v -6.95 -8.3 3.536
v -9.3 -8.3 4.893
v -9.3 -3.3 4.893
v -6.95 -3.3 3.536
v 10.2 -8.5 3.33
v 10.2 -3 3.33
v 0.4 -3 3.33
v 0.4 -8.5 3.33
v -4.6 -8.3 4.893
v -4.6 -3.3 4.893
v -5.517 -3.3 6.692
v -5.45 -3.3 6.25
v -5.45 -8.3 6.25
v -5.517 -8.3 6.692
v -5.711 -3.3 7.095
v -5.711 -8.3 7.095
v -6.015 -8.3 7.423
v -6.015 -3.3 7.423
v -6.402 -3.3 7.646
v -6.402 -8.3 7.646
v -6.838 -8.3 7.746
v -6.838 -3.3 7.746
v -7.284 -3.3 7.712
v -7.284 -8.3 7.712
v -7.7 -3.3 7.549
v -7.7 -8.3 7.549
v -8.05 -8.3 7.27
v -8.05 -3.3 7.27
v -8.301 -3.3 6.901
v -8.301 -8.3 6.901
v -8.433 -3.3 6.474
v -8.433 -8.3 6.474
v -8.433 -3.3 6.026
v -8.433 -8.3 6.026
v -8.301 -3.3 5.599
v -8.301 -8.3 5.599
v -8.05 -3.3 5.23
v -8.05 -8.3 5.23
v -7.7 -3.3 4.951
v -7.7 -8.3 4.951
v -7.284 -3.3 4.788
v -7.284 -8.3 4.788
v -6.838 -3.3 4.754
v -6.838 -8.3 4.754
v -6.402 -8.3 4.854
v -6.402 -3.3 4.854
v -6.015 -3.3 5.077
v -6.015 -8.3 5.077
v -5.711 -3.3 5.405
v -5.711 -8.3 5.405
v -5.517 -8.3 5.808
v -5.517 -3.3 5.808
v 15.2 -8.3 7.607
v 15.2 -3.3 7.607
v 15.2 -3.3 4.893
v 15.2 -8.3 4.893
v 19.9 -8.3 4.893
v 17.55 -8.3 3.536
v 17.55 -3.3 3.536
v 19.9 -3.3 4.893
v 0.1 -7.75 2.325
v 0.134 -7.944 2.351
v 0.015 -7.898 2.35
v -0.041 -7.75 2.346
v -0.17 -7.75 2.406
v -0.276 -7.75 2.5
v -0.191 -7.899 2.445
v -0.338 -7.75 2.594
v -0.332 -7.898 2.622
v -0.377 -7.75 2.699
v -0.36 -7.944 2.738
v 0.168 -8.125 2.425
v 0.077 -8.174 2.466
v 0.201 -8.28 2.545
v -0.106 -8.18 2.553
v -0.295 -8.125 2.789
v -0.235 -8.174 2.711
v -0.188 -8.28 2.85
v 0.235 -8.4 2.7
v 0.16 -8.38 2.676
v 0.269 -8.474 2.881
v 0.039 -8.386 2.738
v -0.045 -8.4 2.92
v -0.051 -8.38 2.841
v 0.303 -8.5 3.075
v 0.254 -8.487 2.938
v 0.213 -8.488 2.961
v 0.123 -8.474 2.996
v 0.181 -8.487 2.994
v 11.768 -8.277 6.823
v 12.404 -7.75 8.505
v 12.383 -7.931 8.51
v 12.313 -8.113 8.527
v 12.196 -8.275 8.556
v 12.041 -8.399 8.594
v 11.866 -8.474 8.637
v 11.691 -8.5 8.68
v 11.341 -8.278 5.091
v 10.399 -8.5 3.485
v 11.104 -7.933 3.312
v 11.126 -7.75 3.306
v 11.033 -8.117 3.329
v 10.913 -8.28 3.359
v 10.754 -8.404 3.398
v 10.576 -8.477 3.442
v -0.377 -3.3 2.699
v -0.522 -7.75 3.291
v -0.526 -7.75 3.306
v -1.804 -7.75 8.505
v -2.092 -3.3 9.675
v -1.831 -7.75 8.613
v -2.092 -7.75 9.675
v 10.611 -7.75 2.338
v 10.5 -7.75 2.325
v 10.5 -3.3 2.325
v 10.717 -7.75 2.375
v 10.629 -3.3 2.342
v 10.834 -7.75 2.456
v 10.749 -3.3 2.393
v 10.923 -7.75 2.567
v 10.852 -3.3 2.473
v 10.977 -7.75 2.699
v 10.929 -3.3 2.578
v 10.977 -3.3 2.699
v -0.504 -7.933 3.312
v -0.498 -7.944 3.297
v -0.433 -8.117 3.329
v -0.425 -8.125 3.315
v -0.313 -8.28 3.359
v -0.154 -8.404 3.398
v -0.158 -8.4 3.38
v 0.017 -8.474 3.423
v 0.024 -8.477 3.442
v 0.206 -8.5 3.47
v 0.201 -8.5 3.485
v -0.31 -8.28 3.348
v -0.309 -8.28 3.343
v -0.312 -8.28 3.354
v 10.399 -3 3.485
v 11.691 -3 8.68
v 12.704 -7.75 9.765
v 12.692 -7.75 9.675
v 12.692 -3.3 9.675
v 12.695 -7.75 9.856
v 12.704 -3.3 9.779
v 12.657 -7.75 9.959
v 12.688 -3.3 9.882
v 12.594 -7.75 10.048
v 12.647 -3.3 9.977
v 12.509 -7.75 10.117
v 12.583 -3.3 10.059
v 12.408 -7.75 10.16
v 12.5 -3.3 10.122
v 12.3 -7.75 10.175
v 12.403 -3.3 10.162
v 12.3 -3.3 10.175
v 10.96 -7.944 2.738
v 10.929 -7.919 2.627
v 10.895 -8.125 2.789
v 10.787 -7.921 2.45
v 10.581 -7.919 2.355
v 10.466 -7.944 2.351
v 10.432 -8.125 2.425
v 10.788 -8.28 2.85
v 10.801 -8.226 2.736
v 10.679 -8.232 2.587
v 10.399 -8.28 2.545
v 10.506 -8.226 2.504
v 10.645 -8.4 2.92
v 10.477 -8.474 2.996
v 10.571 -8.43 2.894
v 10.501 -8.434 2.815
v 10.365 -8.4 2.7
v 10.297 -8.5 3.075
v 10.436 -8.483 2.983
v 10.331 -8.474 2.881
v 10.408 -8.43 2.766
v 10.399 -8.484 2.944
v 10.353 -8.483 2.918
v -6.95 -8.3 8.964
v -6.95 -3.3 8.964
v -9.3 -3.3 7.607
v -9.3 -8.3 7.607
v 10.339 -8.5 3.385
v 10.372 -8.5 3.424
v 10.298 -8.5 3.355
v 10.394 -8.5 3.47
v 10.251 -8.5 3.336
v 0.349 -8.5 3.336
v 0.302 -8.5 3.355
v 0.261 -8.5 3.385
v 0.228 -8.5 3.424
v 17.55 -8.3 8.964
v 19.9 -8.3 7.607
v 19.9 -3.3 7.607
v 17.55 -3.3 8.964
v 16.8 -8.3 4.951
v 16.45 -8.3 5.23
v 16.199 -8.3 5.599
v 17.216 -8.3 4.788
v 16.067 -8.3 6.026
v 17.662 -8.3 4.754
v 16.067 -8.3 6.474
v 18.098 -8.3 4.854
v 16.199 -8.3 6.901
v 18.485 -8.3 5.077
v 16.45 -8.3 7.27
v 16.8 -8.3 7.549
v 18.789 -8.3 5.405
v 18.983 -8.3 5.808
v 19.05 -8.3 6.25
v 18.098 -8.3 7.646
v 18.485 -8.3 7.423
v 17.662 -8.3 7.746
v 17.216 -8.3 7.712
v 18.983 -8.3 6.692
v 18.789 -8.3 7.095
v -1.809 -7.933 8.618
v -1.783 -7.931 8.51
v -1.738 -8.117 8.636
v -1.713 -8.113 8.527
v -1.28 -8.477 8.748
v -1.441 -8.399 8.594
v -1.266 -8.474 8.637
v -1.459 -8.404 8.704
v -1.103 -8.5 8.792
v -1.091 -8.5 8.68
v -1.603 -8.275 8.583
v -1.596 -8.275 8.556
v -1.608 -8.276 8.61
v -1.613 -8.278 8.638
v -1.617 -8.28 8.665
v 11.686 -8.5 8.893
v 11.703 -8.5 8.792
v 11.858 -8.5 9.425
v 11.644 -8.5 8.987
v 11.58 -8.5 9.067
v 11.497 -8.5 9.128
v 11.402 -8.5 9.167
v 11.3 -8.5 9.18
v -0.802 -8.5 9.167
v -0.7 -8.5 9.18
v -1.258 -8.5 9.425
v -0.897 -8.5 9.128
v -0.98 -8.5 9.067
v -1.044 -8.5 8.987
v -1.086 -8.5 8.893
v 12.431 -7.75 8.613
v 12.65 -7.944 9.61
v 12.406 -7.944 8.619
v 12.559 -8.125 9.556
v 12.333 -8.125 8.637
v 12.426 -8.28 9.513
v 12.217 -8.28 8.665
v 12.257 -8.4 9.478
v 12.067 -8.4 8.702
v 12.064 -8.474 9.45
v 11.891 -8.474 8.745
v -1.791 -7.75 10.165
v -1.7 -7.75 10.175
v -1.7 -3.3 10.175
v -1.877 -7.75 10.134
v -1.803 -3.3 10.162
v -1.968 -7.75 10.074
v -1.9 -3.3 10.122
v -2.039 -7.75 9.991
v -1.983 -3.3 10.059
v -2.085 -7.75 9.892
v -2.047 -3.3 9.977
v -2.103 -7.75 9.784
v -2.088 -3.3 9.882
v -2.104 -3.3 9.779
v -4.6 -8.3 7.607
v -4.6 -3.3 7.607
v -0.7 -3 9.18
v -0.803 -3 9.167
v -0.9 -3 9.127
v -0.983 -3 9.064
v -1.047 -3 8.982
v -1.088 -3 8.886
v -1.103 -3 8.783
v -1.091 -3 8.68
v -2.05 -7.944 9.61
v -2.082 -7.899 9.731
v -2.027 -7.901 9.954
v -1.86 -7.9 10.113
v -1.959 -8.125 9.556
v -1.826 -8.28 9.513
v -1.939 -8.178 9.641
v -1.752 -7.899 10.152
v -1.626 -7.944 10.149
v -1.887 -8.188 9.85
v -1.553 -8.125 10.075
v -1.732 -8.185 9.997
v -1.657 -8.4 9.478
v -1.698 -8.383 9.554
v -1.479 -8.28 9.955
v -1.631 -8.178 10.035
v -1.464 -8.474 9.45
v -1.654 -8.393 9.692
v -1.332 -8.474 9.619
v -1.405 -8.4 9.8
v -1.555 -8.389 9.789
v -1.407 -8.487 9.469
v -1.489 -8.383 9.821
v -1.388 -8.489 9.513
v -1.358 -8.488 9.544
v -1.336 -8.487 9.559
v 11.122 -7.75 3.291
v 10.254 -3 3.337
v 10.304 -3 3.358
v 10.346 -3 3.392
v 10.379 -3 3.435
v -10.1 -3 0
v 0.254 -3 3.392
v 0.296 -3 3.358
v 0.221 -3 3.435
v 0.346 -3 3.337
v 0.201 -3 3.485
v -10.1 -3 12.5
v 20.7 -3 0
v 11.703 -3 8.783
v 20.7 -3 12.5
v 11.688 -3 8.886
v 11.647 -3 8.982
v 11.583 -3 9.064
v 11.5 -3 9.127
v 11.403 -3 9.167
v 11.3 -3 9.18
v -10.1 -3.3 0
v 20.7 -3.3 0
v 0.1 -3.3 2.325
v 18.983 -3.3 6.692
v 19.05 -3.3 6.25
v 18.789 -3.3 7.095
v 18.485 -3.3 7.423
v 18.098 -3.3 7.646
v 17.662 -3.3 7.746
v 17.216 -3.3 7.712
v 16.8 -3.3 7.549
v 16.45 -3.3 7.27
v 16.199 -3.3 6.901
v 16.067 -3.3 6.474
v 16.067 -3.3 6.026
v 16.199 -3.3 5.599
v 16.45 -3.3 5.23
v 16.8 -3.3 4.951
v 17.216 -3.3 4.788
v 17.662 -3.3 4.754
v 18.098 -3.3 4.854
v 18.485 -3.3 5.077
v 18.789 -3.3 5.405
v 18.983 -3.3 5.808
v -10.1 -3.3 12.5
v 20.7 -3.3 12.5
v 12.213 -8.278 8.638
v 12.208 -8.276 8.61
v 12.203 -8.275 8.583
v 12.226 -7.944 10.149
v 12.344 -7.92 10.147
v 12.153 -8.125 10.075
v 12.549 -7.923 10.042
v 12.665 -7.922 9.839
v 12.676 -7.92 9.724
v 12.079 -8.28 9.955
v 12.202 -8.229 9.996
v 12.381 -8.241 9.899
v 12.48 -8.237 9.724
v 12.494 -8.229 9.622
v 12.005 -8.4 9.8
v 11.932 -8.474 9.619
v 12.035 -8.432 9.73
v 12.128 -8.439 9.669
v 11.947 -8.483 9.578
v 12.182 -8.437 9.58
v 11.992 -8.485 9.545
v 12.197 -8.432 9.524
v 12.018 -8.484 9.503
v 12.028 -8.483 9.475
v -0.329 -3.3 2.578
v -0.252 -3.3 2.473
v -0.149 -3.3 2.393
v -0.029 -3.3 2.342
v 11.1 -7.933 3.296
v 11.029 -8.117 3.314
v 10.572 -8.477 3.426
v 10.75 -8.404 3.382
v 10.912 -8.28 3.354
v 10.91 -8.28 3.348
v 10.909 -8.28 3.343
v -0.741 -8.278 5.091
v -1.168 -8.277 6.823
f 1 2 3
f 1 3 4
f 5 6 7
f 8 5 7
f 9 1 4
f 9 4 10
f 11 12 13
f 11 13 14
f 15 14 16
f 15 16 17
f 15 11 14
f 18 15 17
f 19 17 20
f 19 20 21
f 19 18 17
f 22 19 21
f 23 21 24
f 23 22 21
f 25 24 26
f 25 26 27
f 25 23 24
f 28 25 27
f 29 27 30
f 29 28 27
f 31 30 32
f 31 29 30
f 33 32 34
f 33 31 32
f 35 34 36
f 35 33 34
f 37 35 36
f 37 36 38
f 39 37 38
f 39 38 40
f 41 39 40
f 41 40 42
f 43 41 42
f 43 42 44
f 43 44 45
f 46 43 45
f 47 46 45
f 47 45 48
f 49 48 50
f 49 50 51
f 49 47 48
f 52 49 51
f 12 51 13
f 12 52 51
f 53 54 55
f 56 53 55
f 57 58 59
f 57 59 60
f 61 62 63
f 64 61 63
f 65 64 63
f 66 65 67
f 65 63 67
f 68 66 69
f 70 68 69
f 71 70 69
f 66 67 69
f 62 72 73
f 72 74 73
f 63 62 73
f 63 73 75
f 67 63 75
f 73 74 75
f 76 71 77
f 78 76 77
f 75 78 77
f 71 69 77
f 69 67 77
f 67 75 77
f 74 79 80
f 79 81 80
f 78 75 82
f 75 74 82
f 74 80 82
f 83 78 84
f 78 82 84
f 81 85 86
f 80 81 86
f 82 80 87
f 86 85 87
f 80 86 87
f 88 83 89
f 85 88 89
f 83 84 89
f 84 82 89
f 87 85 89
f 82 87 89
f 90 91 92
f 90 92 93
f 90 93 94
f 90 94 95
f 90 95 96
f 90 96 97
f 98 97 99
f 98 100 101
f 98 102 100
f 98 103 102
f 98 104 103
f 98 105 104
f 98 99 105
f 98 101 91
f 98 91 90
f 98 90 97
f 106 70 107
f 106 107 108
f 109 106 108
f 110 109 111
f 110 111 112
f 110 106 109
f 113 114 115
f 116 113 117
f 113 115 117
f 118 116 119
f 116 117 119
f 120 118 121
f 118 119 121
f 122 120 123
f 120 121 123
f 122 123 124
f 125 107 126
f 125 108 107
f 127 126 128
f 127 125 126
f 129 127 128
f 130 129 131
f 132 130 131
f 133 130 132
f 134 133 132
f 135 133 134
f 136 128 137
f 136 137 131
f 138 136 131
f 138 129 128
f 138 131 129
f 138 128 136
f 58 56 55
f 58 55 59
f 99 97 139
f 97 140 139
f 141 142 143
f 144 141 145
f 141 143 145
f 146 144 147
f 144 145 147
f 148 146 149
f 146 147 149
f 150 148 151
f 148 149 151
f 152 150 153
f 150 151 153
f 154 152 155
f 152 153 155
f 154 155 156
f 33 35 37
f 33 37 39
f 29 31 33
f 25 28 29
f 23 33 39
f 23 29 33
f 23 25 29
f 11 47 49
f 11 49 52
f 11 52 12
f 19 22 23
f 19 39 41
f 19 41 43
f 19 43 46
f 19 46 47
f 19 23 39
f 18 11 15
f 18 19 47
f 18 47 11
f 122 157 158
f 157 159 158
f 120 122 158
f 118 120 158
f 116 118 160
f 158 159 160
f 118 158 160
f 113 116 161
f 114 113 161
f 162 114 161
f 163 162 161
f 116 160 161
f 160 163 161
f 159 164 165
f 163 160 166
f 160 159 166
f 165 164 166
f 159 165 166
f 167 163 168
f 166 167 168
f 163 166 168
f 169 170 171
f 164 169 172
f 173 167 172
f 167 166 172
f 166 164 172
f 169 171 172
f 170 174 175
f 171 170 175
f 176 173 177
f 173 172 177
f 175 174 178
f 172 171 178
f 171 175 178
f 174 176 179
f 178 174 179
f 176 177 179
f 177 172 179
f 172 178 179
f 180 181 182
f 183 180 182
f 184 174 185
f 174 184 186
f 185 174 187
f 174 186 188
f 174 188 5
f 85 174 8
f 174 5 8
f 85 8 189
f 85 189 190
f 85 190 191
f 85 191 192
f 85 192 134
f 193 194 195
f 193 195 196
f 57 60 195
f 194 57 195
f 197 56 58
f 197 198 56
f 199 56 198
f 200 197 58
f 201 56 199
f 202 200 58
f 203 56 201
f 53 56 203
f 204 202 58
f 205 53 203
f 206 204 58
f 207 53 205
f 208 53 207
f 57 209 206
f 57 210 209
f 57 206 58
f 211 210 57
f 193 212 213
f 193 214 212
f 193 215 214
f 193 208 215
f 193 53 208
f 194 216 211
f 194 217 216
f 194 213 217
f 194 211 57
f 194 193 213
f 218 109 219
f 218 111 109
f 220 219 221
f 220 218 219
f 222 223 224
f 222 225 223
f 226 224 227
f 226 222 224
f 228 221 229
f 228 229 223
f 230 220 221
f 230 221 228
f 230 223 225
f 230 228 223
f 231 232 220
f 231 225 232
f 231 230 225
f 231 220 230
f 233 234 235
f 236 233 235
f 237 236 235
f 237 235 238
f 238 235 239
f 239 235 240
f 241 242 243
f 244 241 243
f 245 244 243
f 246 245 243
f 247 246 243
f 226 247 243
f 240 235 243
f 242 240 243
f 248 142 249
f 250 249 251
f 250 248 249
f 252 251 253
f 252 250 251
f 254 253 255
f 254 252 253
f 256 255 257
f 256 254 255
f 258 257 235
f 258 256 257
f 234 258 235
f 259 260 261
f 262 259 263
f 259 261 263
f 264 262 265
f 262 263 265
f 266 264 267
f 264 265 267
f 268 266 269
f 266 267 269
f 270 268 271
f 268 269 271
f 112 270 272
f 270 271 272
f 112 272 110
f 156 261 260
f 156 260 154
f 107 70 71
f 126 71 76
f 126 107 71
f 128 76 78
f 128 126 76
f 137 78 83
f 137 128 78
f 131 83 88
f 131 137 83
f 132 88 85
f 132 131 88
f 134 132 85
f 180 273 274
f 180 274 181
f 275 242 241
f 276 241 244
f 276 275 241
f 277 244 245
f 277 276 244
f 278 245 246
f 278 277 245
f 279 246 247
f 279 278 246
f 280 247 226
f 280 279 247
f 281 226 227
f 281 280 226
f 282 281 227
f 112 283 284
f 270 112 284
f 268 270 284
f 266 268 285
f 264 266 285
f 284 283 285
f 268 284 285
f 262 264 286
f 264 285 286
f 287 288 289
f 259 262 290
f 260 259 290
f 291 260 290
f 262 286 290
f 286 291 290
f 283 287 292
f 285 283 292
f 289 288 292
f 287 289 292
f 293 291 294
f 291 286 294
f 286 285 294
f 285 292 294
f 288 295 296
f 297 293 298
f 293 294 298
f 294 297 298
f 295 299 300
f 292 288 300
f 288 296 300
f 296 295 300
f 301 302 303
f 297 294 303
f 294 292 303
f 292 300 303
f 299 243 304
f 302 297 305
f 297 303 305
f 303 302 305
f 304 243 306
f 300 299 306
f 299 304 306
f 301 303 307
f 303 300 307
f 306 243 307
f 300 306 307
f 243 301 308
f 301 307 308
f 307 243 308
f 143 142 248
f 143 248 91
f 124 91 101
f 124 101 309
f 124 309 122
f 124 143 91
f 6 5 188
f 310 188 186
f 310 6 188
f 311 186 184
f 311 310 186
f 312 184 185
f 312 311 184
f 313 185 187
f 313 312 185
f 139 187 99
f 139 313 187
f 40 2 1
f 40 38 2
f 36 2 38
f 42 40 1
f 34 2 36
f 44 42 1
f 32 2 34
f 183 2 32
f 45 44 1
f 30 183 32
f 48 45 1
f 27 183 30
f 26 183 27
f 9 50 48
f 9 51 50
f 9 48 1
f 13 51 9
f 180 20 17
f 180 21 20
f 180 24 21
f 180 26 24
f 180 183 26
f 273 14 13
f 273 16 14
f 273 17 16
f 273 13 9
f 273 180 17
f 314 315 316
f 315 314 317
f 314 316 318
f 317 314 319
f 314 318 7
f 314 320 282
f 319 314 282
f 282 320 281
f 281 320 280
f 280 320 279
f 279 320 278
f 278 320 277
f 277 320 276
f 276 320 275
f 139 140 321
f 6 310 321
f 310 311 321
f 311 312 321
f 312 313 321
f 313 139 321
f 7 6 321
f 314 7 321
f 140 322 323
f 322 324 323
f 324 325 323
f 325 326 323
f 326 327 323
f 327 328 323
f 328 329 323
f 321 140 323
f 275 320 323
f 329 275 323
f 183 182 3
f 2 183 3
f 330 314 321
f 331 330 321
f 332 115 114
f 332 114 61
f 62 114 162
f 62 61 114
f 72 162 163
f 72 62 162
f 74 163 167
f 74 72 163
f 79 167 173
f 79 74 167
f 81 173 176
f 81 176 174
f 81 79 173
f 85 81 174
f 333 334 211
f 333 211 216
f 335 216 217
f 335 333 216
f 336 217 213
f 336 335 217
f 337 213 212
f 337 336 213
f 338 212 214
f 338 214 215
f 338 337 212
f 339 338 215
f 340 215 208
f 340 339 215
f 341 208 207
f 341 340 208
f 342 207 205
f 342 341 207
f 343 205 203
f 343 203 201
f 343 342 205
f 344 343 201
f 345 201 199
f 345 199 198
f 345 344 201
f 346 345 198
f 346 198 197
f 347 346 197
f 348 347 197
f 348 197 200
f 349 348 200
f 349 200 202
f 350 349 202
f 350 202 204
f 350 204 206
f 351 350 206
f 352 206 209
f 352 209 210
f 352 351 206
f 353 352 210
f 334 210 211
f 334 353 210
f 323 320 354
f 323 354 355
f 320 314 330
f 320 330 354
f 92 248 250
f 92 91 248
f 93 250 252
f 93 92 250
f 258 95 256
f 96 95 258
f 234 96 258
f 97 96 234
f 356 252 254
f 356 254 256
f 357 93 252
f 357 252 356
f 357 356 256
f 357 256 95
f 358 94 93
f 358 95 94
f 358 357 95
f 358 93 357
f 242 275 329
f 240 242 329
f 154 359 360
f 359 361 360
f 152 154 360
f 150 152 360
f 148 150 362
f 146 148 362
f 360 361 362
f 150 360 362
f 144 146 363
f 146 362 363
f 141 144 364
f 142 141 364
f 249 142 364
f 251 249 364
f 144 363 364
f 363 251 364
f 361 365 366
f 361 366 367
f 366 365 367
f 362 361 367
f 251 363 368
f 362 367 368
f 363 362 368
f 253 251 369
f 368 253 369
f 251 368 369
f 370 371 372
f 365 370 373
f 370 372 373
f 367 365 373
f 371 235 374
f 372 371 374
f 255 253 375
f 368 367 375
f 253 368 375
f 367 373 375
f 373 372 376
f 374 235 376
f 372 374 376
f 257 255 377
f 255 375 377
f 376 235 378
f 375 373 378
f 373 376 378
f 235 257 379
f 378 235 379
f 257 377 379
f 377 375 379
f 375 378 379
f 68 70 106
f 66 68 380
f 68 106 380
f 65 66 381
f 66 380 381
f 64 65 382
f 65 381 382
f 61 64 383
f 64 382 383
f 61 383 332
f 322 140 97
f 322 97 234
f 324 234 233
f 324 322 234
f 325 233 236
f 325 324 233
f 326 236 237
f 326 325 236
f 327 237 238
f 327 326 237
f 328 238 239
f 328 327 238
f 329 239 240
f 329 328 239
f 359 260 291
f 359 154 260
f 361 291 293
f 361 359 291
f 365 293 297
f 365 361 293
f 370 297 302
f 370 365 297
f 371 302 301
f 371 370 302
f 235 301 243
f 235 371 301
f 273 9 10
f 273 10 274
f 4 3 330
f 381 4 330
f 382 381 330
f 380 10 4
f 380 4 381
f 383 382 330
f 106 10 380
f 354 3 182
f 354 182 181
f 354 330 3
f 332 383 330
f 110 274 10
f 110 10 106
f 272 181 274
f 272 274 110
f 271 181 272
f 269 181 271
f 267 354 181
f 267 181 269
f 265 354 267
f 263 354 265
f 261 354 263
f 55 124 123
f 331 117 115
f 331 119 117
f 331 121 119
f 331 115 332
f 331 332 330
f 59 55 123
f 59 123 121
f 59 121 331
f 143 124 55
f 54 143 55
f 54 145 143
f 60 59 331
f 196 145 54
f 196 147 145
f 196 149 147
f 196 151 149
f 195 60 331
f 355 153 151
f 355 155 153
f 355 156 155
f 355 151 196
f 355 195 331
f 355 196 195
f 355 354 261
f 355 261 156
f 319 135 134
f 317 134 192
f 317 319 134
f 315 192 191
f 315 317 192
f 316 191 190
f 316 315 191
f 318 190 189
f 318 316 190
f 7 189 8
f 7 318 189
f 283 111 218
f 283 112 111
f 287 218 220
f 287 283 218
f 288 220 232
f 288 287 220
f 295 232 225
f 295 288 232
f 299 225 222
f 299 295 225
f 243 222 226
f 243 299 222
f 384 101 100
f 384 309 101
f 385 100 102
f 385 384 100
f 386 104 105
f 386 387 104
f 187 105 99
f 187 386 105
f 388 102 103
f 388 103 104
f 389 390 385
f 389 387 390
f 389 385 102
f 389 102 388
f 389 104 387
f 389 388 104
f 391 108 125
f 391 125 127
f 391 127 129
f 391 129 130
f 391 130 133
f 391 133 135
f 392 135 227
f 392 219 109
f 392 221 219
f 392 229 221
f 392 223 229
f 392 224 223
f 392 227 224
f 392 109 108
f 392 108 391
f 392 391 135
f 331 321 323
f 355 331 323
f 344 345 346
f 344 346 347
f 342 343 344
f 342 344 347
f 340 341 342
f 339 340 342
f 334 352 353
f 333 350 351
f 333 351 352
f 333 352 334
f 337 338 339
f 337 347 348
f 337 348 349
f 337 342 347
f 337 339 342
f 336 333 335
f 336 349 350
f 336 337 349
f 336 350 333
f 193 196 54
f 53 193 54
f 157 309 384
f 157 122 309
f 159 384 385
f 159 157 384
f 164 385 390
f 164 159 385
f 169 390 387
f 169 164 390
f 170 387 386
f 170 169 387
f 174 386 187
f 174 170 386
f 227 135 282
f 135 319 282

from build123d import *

# Parameters (mm, degrees)
SKETCH092_W             = 30.8
SKETCH092_H             = 12.5
PAD112_DEPTH            = 0.3
POCKET002_DEPTH         = 0.3
PAD113_DEPTH            = 5.5
POCKET003_DEPTH         = 5.5
FILLET014_R             = 0.75
SKETCH011_R             = 1.5
PAD114_DEPTH            = 5
BODY029_PLACEMENT_ANGLE = 180


with BuildPart() as part:
    # Sketch092 → Pad112 (new body)
    with BuildSketch(Plane(origin=(0, 3, 0), x_dir=(-1, 0, 0), z_dir=(0, 1, 0))):
        with Locations((0, 6.25)):
            Rectangle(SKETCH092_W, SKETCH092_H)
    extrude(amount=PAD112_DEPTH)

    # Sketch091 → Pocket002 (cut)
    with BuildSketch(Plane(origin=(0, 3, 0), x_dir=(-1, 0, 0), z_dir=(0, 1, 0))):
        with BuildLine():
            Line((-7, 10.175), (7, 10.175))
            ThreePointArc((7.391964, 9.675), (7.317662, 10.020388), (7, 10.175))
            Line((7.391964, 9.675), (5.67688, 2.69884))
            ThreePointArc((5.2, 2.325), (5.502973, 2.4296), (5.67688, 2.69884))
            Line((5.2, 2.325), (-5.2, 2.325))
            ThreePointArc((-5.67688, 2.69884), (-5.502973, 2.4296), (-5.2, 2.325))
            Line((-5.67688, 2.69884), (-7.391964, 9.675))
            ThreePointArc((-7, 10.175), (-7.317662, 10.020388), (-7.391964, 9.675))
        make_face()
    extrude(amount=POCKET002_DEPTH, mode=Mode.SUBTRACT)

    # Sketch091 → Pad113 (join)
    with BuildSketch(Plane(origin=(0, 3, 0), x_dir=(-1, 0, 0), z_dir=(0, 1, 0))):
        with BuildLine():
            Line((-7, 10.175), (7, 10.175))
            ThreePointArc((7.391964, 9.675), (7.317662, 10.020388), (7, 10.175))
            Line((7.391964, 9.675), (5.67688, 2.69884))
            ThreePointArc((5.2, 2.325), (5.502973, 2.4296), (5.67688, 2.69884))
            Line((5.2, 2.325), (-5.2, 2.325))
            ThreePointArc((-5.67688, 2.69884), (-5.502973, 2.4296), (-5.2, 2.325))
            Line((-5.67688, 2.69884), (-7.391964, 9.675))
            ThreePointArc((-7, 10.175), (-7.317662, 10.020388), (-7.391964, 9.675))
        make_face()
    extrude(amount=PAD113_DEPTH)

    # Sketch093 → Pocket003 (cut)
    with BuildSketch(Plane(origin=(0, 3, 0), x_dir=(-1, 0, 0), z_dir=(0, 1, 0))):
        with BuildLine():
            Line((-6, 9.18), (6, 9.18))
            ThreePointArc((6.390856, 8.68), (6.31732, 9.025285), (6, 9.18))
            Line((6.390856, 8.68), (5.098578, 3.485231))
            ThreePointArc((4.9, 3.33), (5.026026, 3.373413), (5.098578, 3.485231))
            Line((4.9, 3.33), (-4.9, 3.33))
            ThreePointArc((-5.098578, 3.485231), (-5.026026, 3.373413), (-4.9, 3.33))
            Line((-5.098578, 3.485231), (-6.390856, 8.68))
            ThreePointArc((-6, 9.18), (-6.31732, 9.025285), (-6.390856, 8.68))
        make_face()
    extrude(amount=POCKET003_DEPTH, mode=Mode.SUBTRACT)

    # Fillet014
    fillet014_edges = [part.edges().sort_by_distance(p)[0] for p in [
        (0, 8.5, 10.175),
        (7.317662, 8.5, 10.020388),
        (6.534422, 8.5, 6.18692),
        (5.502973, 8.5, 2.4296),
        (0, 8.5, 2.325),
        (-5.502973, 8.5, 2.4296),
        (-6.534422, 8.5, 6.18692),
        (-7.317662, 8.5, 10.020388),
    ]]
    fillet(fillet014_edges, radius=FILLET014_R)

    # Sketch011 → Pad114 (join)
    with BuildSketch(Plane(origin=(0, 3.3, 0), x_dir=(-1, 0, 0), z_dir=(0, 1, 0))):
        Polygon((-9.9, 4.893227), (-9.9, 7.606773), (-12.25, 8.963546), (-14.6, 7.606773), (-14.6, 4.893227), (-12.25, 3.536454), align=None)
        with Locations((-12.25, 6.25)):
            Circle(SKETCH011_R, mode=Mode.SUBTRACT)
        Polygon((14.6, 4.893227), (14.6, 7.606773), (12.25, 8.963546), (9.9, 7.606773), (9.9, 4.893227), (12.25, 3.536454), align=None)
        with Locations((12.25, 6.25)):
            Circle(SKETCH011_R, mode=Mode.SUBTRACT)
    extrude(amount=PAD114_DEPTH)


with BuildPart() as part_1:
    # Body029 placement: moved
    add(part.part.moved(Location((5.3, 0, 0))).rotate(Axis((5.3, 0, 0), (0, 0, 1)), BODY029_PLACEMENT_ANGLE))


solid = part_1.part
